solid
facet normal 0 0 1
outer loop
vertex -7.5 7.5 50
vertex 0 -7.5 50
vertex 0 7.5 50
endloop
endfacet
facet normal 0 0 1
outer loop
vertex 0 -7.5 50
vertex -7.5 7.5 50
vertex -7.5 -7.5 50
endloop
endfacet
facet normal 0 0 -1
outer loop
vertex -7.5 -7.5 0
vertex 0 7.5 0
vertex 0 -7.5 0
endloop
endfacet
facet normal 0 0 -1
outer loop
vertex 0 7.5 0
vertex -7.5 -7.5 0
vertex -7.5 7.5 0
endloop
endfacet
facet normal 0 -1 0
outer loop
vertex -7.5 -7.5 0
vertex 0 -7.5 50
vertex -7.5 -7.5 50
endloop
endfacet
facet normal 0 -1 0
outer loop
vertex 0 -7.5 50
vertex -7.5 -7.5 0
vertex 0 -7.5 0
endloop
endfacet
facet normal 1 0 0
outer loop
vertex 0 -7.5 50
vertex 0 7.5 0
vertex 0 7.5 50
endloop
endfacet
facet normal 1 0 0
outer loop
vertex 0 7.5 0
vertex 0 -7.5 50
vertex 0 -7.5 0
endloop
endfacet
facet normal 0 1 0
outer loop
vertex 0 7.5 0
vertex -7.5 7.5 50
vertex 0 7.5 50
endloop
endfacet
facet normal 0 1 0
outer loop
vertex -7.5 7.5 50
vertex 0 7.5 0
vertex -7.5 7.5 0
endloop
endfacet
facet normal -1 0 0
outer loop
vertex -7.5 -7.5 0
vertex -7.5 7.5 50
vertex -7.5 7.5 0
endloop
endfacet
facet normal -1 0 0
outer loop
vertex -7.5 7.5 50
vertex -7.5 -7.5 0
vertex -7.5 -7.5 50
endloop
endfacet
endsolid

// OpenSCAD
// file: Library/center.scad
module center(axis){
	translate((axis / -2.0)){
		children();
	}
}
// main file
use <Library/center.scad>

diameter = 15;
height = 50;

//Positive space of place behind the chimney.
//To difference with chimney later.
module CylinderDispenser_Dispenser_Virgin_Flue_FlatBack(diameter, height){
	radius = diameter / 2.0;
	center([diameter, diameter, 0]){
		cube([radius, diameter, height]);
	}
}
CylinderDispenser_Dispenser_Virgin_Flue_FlatBack(diameter, height);
